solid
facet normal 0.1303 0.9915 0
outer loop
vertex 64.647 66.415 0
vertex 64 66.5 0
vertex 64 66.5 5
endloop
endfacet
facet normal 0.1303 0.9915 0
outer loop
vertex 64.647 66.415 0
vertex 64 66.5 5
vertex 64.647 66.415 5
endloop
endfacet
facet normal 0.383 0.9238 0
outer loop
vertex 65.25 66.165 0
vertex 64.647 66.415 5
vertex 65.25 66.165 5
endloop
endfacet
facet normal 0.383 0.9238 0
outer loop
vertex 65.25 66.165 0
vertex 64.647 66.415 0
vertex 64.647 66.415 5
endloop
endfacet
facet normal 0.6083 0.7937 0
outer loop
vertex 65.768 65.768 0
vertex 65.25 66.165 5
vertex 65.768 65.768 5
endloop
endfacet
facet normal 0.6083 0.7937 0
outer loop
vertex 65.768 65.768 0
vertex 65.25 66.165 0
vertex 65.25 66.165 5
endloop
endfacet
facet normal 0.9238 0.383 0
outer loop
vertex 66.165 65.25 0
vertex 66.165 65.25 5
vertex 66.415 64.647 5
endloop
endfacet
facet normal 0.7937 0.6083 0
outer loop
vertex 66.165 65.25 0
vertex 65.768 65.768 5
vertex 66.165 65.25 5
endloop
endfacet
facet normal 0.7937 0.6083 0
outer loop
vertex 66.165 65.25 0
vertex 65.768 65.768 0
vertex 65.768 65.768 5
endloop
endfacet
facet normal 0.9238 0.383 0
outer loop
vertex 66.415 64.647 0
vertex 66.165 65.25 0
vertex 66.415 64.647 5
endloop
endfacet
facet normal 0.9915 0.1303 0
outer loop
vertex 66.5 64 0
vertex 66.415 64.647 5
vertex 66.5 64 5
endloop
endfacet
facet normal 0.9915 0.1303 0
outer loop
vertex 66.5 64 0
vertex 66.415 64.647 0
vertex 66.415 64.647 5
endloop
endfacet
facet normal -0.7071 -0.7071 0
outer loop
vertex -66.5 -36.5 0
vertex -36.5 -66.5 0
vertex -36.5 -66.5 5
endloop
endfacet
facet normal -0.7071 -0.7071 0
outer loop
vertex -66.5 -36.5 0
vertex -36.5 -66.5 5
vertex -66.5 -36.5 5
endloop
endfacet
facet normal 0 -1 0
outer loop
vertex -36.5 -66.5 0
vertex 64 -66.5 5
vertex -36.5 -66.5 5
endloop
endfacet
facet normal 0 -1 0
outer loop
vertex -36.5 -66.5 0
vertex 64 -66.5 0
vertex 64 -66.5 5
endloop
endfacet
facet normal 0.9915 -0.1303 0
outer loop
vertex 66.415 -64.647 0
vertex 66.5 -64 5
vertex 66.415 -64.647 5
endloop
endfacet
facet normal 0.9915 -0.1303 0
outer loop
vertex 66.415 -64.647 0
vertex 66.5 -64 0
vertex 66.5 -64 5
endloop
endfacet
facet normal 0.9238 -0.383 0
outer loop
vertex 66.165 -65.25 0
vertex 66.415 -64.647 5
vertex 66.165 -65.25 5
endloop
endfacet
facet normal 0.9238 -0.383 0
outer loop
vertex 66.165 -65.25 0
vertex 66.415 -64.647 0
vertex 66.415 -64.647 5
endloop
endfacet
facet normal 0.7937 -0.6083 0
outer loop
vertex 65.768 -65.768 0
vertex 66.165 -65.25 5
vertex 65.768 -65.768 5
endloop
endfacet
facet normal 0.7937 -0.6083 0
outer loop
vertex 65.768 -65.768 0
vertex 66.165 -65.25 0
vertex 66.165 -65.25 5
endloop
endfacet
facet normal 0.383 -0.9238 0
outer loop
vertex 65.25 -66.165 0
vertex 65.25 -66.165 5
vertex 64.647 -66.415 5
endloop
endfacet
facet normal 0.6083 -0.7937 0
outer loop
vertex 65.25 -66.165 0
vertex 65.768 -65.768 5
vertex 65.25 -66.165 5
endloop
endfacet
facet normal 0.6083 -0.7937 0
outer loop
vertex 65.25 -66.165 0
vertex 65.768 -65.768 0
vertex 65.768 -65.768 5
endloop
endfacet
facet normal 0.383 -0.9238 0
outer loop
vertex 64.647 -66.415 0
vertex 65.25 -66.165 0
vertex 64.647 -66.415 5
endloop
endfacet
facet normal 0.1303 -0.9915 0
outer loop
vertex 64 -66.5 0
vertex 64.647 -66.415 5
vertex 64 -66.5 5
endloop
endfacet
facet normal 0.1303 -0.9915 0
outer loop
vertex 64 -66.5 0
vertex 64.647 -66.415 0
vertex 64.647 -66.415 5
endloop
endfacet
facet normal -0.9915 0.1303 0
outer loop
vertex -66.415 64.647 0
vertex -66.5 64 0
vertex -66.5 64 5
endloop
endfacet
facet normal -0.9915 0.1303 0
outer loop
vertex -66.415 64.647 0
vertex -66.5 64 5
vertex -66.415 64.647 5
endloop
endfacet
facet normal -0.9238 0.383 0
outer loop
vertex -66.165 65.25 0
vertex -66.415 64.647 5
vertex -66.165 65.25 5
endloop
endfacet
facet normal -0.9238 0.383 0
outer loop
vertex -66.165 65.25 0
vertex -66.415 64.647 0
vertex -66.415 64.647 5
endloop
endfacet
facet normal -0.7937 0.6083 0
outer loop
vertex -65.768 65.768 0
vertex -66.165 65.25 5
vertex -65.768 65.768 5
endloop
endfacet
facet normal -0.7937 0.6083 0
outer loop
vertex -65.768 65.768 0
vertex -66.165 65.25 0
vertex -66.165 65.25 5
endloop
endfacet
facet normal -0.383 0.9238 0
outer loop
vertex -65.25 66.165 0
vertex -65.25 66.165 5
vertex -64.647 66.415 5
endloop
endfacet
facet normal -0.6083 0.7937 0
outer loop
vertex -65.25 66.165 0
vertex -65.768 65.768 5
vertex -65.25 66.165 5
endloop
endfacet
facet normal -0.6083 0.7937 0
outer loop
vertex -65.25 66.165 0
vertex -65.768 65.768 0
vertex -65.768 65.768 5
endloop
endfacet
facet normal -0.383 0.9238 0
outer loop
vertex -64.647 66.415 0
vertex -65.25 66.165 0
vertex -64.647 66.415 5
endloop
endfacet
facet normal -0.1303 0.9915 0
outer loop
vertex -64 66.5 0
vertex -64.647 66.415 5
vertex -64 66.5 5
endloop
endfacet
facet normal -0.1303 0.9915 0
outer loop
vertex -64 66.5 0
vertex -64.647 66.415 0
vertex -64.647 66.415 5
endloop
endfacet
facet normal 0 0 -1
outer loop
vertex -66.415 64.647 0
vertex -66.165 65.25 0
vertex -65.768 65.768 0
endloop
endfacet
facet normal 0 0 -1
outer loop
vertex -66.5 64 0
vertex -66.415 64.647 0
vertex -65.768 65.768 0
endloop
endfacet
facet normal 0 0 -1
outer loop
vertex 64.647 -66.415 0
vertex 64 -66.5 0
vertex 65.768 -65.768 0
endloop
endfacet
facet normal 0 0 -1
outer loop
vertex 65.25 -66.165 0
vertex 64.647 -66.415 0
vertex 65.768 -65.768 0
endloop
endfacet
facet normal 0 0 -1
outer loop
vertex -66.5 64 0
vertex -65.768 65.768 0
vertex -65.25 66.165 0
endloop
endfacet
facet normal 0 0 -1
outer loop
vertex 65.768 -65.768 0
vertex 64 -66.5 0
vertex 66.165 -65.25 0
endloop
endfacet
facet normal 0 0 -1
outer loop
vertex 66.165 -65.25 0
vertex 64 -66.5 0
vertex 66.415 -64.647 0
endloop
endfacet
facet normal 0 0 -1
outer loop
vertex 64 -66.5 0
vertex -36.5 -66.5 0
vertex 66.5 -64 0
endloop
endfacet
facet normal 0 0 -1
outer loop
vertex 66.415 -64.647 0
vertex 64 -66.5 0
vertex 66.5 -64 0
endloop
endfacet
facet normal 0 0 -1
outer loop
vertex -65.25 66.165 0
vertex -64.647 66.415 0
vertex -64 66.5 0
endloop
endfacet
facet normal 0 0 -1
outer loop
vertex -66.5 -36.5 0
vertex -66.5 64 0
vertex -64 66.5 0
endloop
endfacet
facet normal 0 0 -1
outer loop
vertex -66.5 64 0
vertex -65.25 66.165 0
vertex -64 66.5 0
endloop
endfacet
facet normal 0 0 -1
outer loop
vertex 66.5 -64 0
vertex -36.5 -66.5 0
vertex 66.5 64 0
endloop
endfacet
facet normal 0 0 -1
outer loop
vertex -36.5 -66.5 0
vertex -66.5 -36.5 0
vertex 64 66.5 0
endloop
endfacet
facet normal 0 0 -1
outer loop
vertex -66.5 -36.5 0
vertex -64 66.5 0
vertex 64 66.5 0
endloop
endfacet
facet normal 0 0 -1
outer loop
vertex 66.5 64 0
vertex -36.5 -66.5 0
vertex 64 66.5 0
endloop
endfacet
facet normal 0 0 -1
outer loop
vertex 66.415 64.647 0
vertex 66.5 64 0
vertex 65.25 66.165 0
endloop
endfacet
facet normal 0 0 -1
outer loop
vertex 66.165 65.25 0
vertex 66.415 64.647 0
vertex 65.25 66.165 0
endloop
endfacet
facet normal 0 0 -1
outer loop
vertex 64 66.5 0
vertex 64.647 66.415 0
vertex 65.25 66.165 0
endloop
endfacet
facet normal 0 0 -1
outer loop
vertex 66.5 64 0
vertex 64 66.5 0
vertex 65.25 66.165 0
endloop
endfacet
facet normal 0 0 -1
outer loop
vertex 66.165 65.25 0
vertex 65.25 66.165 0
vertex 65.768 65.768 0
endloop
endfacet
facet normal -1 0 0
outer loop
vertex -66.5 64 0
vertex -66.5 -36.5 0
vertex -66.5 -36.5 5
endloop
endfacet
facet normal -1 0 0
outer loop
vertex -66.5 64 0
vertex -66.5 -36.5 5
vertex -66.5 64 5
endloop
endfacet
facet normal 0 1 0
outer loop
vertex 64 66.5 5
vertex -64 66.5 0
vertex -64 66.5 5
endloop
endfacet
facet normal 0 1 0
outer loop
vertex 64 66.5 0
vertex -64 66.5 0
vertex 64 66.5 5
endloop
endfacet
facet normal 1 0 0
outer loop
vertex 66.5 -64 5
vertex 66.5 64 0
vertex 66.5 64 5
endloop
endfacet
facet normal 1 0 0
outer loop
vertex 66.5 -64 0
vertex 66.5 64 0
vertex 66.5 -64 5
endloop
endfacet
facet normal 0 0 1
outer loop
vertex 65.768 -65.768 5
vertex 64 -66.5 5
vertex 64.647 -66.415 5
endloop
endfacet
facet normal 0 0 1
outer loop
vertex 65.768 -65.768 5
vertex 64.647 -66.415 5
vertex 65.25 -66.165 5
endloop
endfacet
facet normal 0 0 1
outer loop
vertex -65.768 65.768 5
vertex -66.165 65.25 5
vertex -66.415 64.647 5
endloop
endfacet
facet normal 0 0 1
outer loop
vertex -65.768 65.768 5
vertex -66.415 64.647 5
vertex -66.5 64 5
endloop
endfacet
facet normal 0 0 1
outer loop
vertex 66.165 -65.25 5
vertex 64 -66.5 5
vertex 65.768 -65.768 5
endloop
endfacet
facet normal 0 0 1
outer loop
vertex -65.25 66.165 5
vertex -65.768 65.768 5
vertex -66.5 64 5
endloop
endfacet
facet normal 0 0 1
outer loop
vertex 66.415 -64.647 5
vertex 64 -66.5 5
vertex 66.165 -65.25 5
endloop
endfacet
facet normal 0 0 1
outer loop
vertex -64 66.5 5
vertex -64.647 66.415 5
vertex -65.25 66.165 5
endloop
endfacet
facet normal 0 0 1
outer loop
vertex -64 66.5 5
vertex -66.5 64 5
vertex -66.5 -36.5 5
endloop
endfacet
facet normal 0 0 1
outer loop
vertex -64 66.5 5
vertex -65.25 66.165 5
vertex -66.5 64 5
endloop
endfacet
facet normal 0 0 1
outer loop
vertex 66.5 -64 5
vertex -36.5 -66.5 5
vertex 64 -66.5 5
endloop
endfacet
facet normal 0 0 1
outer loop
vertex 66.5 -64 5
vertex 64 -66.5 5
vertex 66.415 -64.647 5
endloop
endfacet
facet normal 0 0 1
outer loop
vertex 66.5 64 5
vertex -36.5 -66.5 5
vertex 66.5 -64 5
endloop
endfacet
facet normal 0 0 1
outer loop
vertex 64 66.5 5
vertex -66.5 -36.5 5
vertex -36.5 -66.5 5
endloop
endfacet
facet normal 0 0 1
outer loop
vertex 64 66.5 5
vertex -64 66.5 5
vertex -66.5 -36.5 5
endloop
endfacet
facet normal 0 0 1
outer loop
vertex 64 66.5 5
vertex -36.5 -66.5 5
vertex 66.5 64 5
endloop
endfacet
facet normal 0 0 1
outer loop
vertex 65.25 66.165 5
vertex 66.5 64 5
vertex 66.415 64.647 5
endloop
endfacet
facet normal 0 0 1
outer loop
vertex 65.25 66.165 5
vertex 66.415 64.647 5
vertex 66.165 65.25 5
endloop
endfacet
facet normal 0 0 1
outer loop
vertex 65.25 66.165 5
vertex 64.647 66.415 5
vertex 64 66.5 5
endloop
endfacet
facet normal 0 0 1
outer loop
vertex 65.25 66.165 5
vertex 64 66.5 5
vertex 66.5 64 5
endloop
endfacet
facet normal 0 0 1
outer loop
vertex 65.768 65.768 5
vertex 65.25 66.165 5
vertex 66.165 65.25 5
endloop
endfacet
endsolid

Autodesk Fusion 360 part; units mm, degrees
sketch "Sketch1" plane through (0, 0, 0) normal (0, 0, 1) x (1, 0, 0)
  line L0 (-64, 66.5) -> (64, 66.5)
  line L1 (66.5, 64) -> (66.5, -64)
  line L2 (64, -66.5) -> (-36.5, -66.5)
  line L3 (-66.5, -36.5) -> (-66.5, 64)
  line L4 (-36.5, -66.5) -> (-66.5, -36.5)
  arc A0 (-64, 66.5) -> (-66.5, 64) centre (-64, 64) ccw
  arc A1 (66.5, 64) -> (64, 66.5) centre (64, 64) ccw
  arc A2 (64, -66.5) -> (66.5, -64) centre (64, -64) ccw
extrude "Extrude1" add sketch "Sketch1" along normal blind 5
sketch "Sketch2" plane through (0, 0, 5) normal (0, 0, 1) x (-1, 0, 0)
  line L0 (36.5, 66.5) -> (-64, 66.5)
  arc A0 (-64, 66.5) -> (-66.5, 64) centre (-64, 64) ccw
  line L1 (-66.5, 64) -> (-66.5, -64)
  arc A1 (-66.5, -64) -> (-64, -66.5) centre (-64, -64) ccw
  line L2 (-64, -66.5) -> (64, -66.5)
  arc A2 (64, -66.5) -> (66.5, -64) centre (64, -64) ccw
  line L3 (66.5, -64) -> (66.5, 36.5)
  line L4 (66.5, 36.5) -> (36.5, 66.5)
  circle A3 centre (0, 0) radius 20
  circle A4 centre (0, 0) radius 16.5
  line L5 (-56.5, -66.5) -> (56.5, -66.5)
  line L6 (56.5, -66.5) -> (56.5, -50.5727)
  line L7 (49, -43.0727) -> (-49, -43.0727)
  line L8 (-56.5, -50.5727) -> (-56.5, -66.5)
  arc A5 (56.5, -50.5727) -> (49, -43.0727) centre (49, -50.5727) ccw
  arc A6 (-49, -43.0727) -> (-56.5, -50.5727) centre (-49, -50.5727) ccw
